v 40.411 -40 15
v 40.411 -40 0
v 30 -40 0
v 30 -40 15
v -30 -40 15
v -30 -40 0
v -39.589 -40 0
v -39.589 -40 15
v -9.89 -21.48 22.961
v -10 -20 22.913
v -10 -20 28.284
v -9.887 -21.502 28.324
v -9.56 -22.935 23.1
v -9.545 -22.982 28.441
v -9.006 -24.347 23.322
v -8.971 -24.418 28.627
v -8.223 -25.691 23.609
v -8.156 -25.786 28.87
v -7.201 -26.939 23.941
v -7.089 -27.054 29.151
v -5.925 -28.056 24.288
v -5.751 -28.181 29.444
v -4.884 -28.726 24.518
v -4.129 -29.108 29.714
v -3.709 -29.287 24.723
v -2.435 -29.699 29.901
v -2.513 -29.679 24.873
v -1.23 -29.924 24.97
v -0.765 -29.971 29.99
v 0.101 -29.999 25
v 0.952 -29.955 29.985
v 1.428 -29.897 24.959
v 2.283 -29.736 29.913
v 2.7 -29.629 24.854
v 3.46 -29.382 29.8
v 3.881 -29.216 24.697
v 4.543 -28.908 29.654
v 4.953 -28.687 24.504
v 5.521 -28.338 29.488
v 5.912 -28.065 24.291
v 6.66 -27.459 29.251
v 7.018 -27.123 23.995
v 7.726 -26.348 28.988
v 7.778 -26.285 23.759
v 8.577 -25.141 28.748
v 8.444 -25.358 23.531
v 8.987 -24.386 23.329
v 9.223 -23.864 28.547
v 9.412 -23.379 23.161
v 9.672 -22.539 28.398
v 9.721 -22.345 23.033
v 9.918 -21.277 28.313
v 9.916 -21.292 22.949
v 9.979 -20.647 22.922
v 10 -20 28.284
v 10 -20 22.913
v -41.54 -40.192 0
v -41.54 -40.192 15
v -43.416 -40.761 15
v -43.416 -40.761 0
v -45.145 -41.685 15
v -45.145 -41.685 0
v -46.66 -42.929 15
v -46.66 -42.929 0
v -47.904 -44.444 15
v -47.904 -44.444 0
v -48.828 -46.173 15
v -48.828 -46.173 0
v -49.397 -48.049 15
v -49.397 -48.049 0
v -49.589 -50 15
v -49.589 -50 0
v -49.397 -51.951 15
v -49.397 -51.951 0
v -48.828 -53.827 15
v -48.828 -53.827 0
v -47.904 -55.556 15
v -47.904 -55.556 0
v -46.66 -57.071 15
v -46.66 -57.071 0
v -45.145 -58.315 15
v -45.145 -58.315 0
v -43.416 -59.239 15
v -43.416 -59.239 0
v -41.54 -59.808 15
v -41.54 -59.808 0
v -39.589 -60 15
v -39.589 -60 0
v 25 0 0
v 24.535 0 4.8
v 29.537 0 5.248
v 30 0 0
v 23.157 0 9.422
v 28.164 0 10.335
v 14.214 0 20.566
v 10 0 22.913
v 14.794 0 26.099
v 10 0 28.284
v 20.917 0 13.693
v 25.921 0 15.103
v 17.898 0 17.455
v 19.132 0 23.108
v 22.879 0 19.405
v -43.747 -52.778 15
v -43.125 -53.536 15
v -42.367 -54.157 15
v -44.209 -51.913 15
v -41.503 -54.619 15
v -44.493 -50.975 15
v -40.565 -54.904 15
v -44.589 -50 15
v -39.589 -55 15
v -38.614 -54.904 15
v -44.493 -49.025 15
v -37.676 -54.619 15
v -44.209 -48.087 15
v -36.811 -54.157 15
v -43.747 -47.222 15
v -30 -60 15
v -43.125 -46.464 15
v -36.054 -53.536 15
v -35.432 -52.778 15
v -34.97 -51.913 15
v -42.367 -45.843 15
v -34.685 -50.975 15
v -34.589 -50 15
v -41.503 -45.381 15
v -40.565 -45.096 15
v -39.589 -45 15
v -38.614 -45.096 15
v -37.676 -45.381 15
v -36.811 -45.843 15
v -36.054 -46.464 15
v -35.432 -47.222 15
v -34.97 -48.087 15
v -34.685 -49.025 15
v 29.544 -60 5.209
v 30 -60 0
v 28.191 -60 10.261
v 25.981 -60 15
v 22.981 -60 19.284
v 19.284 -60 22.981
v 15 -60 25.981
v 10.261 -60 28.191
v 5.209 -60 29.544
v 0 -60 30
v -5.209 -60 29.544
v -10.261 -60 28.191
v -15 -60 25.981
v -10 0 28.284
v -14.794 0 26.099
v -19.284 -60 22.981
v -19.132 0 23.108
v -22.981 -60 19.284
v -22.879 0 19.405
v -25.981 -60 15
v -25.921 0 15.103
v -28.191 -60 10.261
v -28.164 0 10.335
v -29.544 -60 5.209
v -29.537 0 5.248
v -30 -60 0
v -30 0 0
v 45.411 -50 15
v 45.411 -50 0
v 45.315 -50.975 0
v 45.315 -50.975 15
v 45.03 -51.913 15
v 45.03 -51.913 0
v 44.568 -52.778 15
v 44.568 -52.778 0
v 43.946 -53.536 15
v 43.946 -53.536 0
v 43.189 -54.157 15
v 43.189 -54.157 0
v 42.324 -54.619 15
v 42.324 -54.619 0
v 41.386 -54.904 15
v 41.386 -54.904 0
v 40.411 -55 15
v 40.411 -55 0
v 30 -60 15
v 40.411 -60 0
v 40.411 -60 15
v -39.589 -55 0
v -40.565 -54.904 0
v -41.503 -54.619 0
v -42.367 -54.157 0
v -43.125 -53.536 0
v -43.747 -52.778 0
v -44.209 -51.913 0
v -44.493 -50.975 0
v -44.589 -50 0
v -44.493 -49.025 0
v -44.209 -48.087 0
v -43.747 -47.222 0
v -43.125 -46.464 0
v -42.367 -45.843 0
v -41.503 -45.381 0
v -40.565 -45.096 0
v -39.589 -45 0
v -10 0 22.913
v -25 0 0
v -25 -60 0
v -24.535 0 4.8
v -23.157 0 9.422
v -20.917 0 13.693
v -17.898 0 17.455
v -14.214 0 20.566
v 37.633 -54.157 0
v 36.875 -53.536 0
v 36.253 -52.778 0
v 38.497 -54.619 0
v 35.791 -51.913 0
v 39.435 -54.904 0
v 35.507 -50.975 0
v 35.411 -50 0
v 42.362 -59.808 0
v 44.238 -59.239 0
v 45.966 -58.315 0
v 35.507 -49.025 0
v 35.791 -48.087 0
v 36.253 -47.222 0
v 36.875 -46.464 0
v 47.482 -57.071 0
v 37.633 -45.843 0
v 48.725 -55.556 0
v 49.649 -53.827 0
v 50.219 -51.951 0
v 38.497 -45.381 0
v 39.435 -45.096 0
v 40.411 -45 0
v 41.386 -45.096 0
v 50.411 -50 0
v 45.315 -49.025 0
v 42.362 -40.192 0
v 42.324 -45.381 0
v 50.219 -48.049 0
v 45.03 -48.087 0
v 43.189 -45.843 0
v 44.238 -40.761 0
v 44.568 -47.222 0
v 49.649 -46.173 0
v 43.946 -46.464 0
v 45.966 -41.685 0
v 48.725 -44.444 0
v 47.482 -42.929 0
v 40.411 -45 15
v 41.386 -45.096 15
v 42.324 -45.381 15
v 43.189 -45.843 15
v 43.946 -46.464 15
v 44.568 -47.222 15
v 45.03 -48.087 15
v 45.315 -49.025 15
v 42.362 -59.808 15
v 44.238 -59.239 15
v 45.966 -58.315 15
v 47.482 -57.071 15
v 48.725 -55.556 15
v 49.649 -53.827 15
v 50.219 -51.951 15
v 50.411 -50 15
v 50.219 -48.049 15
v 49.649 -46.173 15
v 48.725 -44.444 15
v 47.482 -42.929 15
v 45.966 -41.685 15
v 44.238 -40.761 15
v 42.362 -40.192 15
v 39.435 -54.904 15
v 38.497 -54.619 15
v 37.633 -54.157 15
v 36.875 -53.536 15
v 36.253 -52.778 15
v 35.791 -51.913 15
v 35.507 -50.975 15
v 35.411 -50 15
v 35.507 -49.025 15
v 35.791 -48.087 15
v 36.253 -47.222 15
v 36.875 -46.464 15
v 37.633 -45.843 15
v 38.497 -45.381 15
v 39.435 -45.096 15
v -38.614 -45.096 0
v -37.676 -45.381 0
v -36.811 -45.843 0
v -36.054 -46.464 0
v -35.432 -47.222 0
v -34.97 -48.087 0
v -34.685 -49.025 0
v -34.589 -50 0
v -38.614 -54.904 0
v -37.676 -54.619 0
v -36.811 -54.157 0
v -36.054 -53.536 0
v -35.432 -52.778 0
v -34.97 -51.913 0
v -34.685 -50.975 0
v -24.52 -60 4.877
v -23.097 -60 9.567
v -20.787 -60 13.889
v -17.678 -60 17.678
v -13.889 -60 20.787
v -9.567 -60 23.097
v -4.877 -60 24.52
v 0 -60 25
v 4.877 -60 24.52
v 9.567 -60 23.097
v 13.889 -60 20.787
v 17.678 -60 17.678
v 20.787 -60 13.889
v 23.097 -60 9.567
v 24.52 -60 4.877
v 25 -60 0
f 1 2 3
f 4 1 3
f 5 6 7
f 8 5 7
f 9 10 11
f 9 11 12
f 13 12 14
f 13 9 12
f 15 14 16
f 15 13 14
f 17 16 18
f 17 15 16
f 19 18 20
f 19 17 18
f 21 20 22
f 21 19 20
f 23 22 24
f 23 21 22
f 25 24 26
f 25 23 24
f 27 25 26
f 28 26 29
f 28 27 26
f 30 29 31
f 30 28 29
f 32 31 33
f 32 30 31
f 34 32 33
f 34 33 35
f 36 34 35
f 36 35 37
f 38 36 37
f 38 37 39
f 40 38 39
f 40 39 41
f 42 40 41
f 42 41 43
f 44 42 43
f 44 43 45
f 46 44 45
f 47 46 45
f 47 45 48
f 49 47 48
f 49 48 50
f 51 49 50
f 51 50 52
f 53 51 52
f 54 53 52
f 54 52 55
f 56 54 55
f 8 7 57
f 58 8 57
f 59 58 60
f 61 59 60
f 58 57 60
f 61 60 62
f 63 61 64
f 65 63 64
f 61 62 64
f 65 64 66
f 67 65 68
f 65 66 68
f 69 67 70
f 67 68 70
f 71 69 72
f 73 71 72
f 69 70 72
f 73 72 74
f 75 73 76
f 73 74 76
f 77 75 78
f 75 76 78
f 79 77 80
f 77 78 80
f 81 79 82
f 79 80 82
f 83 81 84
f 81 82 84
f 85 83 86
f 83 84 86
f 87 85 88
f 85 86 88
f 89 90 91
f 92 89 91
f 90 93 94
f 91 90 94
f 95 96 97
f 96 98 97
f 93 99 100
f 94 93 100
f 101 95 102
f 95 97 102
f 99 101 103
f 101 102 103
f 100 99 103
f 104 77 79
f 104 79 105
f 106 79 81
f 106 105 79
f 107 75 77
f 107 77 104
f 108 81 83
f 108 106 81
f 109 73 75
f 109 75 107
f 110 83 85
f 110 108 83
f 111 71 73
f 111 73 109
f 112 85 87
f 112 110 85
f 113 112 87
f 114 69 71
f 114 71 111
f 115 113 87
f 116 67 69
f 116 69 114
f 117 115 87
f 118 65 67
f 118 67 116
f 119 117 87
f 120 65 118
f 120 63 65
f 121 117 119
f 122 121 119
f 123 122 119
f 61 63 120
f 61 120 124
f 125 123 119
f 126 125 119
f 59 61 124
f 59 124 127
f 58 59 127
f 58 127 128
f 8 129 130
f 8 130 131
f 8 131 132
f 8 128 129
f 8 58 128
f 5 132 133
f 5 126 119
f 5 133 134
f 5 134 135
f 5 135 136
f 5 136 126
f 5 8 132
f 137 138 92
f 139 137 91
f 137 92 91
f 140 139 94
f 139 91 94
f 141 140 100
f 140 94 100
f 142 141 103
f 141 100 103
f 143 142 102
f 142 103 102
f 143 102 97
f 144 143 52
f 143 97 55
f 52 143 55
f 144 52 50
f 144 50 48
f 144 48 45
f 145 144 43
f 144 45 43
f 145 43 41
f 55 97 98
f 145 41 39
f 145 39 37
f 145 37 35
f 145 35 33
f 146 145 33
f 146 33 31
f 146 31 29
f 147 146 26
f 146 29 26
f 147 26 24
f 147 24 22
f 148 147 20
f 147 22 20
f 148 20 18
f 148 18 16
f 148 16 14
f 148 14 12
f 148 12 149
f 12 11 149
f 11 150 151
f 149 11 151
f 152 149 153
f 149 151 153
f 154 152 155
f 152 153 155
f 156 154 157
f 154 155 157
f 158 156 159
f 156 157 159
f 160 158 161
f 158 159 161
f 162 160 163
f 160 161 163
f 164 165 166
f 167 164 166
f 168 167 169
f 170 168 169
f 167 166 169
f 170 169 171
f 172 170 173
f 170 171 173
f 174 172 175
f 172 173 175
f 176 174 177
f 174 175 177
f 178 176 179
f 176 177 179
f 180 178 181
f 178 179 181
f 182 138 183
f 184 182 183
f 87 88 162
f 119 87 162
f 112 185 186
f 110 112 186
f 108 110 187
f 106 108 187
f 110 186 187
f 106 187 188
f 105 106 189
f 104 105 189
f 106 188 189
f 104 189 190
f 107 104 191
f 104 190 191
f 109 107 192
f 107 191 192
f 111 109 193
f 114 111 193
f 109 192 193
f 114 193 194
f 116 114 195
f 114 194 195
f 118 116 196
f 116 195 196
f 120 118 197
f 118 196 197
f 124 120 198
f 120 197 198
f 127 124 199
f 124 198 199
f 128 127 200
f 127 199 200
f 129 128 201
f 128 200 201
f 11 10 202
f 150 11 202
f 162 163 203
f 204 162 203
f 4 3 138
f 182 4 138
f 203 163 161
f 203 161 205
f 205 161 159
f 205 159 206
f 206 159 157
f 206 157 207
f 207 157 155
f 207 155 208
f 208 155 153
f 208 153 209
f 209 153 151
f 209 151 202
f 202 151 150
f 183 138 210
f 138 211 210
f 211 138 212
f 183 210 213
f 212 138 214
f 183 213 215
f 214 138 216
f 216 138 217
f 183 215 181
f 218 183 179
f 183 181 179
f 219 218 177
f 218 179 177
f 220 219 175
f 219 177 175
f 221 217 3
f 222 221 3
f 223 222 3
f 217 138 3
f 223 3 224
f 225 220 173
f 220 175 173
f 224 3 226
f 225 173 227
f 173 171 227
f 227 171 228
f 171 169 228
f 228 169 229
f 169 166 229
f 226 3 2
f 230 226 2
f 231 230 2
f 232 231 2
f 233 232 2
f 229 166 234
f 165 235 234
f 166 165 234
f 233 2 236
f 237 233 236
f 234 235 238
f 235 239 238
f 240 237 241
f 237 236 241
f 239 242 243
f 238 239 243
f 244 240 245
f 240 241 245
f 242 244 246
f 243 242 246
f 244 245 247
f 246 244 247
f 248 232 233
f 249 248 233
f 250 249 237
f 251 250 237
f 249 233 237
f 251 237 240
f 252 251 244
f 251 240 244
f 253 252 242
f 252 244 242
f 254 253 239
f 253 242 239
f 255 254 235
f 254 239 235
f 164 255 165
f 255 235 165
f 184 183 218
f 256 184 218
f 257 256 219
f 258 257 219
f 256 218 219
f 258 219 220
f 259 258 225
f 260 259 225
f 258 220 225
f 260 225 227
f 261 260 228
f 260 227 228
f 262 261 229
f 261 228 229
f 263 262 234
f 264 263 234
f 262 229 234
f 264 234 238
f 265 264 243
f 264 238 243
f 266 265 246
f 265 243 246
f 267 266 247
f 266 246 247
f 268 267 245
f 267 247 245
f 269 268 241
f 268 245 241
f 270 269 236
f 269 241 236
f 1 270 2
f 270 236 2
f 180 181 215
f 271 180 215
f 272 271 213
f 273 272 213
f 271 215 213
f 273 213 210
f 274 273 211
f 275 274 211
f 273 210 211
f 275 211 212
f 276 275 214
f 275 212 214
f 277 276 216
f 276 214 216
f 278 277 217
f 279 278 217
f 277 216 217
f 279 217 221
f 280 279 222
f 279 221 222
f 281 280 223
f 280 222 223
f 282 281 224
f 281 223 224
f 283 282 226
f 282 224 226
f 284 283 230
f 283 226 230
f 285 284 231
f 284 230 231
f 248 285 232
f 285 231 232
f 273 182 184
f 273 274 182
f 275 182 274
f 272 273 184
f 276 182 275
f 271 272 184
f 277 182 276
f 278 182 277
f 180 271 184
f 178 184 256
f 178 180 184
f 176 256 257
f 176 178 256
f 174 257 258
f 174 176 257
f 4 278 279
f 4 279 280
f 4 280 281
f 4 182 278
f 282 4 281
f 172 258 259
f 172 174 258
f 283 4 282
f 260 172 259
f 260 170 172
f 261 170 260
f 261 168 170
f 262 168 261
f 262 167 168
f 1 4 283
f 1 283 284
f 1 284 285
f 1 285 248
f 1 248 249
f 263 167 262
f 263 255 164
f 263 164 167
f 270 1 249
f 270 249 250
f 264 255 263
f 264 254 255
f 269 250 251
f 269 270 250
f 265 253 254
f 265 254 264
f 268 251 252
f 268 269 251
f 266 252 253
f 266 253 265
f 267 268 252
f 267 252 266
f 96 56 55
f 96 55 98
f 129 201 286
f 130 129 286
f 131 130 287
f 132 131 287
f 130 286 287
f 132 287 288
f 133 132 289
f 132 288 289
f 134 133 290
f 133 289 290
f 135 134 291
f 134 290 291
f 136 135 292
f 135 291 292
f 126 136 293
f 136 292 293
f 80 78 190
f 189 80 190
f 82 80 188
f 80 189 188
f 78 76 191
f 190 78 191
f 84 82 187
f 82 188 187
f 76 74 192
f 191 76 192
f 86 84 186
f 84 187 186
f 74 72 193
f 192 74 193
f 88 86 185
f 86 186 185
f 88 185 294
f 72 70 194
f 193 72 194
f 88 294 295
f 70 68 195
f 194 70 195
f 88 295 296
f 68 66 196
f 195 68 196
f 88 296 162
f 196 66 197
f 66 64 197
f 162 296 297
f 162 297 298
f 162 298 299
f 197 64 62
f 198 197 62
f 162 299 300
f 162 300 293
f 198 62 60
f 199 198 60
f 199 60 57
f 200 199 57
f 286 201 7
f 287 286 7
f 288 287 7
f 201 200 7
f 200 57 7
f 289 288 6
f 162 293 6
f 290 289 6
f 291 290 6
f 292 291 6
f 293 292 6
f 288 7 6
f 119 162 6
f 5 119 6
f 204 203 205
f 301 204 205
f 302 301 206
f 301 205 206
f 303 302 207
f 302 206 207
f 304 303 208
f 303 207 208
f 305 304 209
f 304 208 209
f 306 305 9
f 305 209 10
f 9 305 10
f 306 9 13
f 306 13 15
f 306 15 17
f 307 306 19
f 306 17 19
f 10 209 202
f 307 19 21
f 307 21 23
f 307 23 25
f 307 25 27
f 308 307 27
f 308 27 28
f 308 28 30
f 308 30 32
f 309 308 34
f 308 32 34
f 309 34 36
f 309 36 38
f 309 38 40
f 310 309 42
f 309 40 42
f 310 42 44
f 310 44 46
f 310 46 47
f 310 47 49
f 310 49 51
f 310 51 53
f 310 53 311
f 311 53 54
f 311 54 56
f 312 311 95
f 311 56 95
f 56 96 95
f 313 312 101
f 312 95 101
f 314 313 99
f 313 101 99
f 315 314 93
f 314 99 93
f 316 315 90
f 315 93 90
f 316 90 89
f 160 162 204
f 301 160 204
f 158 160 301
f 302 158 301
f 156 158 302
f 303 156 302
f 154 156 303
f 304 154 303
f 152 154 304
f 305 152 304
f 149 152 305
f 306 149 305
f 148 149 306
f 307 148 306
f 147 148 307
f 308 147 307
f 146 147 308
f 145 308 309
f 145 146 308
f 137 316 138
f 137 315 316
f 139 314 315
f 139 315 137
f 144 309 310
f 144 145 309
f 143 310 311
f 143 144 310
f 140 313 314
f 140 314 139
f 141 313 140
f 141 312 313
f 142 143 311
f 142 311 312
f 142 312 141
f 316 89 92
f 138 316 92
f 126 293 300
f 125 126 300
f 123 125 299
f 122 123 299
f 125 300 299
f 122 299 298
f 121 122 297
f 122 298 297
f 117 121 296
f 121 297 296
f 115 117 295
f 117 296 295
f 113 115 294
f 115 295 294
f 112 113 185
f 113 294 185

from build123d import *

# Parameters (mm, degrees)
F1_DEPTH = 60
F2_W     = 20
F2_H     = 40
F3_DEPTH = 30.001
F5_DEPTH = 15


with BuildPart() as f1:
    # F0 (on Front) → F1 (new body)
    with BuildSketch(Plane.XZ):
        with BuildLine():
            Line((25, 0), (30, 0))
            ThreePointArc((30, 0), (0, 30), (-30, 0))
            Line((-30, 0), (-25, 0))
            ThreePointArc((-25, 0), (0, 25), (25, 0))
        make_face()
    extrude(amount=F1_DEPTH)

    # F2 (on Top) → F3 (cut, through all)
    with BuildSketch(Plane.XY):
        Rectangle(F2_W, F2_H)
        with BuildLine():
            Line((10, -20), (-10, -20))
            ThreePointArc((-10, -20), (0, -30), (10, -20))
        make_face()
    extrude(amount=F3_DEPTH, mode=Mode.SUBTRACT)


with BuildPart() as f5:
    # F4 (on Top) → F5 (new body)
    with BuildSketch(Plane.XY):
        with BuildLine():
            Line((-30, -40), (-39.589307, -40))
            Line((-39.589307, -40), (-39.589307, -45))
            ThreePointArc((-39.589307, -45), (-36.053773, -46.464466), (-34.589307, -50))
            ThreePointArc((-34.589307, -50), (-36.053773, -53.535534), (-39.589307, -55))
            Line((-39.589307, -55), (-39.589307, -60))
            Line((-39.589307, -60), (-30, -60))
            Line((-30, -60), (-30, -40))
        make_face()
        with BuildLine():
            Line((-39.589307, -45), (-39.589307, -40))
            ThreePointArc((-39.589307, -40), (-49.589307, -50), (-39.589307, -60))
            Line((-39.589307, -60), (-39.589307, -55))
            ThreePointArc((-39.589307, -55), (-44.589307, -50), (-39.589307, -45))
        make_face()
        with BuildLine():
            Line((40.410693, -45), (40.410693, -40))
            Line((40.410693, -40), (30, -40))
            Line((30, -40), (30, -60))
            Line((30, -60), (40.410693, -60))
            Line((40.410693, -60), (40.410693, -55))
            ThreePointArc((40.410693, -55), (35.410693, -50), (40.410693, -45))
        make_face()
        with BuildLine():
            ThreePointArc((40.410693, -60), (50.410693, -50), (40.410693, -40))
            Line((40.410693, -40), (40.410693, -45))
            ThreePointArc((40.410693, -45), (43.946227, -46.464466), (45.410693, -50))
            ThreePointArc((45.410693, -50), (43.946227, -53.535534), (40.410693, -55))
            Line((40.410693, -55), (40.410693, -60))
        make_face()
    extrude(amount=F5_DEPTH)


solid = Compound([f1.part, f5.part])
